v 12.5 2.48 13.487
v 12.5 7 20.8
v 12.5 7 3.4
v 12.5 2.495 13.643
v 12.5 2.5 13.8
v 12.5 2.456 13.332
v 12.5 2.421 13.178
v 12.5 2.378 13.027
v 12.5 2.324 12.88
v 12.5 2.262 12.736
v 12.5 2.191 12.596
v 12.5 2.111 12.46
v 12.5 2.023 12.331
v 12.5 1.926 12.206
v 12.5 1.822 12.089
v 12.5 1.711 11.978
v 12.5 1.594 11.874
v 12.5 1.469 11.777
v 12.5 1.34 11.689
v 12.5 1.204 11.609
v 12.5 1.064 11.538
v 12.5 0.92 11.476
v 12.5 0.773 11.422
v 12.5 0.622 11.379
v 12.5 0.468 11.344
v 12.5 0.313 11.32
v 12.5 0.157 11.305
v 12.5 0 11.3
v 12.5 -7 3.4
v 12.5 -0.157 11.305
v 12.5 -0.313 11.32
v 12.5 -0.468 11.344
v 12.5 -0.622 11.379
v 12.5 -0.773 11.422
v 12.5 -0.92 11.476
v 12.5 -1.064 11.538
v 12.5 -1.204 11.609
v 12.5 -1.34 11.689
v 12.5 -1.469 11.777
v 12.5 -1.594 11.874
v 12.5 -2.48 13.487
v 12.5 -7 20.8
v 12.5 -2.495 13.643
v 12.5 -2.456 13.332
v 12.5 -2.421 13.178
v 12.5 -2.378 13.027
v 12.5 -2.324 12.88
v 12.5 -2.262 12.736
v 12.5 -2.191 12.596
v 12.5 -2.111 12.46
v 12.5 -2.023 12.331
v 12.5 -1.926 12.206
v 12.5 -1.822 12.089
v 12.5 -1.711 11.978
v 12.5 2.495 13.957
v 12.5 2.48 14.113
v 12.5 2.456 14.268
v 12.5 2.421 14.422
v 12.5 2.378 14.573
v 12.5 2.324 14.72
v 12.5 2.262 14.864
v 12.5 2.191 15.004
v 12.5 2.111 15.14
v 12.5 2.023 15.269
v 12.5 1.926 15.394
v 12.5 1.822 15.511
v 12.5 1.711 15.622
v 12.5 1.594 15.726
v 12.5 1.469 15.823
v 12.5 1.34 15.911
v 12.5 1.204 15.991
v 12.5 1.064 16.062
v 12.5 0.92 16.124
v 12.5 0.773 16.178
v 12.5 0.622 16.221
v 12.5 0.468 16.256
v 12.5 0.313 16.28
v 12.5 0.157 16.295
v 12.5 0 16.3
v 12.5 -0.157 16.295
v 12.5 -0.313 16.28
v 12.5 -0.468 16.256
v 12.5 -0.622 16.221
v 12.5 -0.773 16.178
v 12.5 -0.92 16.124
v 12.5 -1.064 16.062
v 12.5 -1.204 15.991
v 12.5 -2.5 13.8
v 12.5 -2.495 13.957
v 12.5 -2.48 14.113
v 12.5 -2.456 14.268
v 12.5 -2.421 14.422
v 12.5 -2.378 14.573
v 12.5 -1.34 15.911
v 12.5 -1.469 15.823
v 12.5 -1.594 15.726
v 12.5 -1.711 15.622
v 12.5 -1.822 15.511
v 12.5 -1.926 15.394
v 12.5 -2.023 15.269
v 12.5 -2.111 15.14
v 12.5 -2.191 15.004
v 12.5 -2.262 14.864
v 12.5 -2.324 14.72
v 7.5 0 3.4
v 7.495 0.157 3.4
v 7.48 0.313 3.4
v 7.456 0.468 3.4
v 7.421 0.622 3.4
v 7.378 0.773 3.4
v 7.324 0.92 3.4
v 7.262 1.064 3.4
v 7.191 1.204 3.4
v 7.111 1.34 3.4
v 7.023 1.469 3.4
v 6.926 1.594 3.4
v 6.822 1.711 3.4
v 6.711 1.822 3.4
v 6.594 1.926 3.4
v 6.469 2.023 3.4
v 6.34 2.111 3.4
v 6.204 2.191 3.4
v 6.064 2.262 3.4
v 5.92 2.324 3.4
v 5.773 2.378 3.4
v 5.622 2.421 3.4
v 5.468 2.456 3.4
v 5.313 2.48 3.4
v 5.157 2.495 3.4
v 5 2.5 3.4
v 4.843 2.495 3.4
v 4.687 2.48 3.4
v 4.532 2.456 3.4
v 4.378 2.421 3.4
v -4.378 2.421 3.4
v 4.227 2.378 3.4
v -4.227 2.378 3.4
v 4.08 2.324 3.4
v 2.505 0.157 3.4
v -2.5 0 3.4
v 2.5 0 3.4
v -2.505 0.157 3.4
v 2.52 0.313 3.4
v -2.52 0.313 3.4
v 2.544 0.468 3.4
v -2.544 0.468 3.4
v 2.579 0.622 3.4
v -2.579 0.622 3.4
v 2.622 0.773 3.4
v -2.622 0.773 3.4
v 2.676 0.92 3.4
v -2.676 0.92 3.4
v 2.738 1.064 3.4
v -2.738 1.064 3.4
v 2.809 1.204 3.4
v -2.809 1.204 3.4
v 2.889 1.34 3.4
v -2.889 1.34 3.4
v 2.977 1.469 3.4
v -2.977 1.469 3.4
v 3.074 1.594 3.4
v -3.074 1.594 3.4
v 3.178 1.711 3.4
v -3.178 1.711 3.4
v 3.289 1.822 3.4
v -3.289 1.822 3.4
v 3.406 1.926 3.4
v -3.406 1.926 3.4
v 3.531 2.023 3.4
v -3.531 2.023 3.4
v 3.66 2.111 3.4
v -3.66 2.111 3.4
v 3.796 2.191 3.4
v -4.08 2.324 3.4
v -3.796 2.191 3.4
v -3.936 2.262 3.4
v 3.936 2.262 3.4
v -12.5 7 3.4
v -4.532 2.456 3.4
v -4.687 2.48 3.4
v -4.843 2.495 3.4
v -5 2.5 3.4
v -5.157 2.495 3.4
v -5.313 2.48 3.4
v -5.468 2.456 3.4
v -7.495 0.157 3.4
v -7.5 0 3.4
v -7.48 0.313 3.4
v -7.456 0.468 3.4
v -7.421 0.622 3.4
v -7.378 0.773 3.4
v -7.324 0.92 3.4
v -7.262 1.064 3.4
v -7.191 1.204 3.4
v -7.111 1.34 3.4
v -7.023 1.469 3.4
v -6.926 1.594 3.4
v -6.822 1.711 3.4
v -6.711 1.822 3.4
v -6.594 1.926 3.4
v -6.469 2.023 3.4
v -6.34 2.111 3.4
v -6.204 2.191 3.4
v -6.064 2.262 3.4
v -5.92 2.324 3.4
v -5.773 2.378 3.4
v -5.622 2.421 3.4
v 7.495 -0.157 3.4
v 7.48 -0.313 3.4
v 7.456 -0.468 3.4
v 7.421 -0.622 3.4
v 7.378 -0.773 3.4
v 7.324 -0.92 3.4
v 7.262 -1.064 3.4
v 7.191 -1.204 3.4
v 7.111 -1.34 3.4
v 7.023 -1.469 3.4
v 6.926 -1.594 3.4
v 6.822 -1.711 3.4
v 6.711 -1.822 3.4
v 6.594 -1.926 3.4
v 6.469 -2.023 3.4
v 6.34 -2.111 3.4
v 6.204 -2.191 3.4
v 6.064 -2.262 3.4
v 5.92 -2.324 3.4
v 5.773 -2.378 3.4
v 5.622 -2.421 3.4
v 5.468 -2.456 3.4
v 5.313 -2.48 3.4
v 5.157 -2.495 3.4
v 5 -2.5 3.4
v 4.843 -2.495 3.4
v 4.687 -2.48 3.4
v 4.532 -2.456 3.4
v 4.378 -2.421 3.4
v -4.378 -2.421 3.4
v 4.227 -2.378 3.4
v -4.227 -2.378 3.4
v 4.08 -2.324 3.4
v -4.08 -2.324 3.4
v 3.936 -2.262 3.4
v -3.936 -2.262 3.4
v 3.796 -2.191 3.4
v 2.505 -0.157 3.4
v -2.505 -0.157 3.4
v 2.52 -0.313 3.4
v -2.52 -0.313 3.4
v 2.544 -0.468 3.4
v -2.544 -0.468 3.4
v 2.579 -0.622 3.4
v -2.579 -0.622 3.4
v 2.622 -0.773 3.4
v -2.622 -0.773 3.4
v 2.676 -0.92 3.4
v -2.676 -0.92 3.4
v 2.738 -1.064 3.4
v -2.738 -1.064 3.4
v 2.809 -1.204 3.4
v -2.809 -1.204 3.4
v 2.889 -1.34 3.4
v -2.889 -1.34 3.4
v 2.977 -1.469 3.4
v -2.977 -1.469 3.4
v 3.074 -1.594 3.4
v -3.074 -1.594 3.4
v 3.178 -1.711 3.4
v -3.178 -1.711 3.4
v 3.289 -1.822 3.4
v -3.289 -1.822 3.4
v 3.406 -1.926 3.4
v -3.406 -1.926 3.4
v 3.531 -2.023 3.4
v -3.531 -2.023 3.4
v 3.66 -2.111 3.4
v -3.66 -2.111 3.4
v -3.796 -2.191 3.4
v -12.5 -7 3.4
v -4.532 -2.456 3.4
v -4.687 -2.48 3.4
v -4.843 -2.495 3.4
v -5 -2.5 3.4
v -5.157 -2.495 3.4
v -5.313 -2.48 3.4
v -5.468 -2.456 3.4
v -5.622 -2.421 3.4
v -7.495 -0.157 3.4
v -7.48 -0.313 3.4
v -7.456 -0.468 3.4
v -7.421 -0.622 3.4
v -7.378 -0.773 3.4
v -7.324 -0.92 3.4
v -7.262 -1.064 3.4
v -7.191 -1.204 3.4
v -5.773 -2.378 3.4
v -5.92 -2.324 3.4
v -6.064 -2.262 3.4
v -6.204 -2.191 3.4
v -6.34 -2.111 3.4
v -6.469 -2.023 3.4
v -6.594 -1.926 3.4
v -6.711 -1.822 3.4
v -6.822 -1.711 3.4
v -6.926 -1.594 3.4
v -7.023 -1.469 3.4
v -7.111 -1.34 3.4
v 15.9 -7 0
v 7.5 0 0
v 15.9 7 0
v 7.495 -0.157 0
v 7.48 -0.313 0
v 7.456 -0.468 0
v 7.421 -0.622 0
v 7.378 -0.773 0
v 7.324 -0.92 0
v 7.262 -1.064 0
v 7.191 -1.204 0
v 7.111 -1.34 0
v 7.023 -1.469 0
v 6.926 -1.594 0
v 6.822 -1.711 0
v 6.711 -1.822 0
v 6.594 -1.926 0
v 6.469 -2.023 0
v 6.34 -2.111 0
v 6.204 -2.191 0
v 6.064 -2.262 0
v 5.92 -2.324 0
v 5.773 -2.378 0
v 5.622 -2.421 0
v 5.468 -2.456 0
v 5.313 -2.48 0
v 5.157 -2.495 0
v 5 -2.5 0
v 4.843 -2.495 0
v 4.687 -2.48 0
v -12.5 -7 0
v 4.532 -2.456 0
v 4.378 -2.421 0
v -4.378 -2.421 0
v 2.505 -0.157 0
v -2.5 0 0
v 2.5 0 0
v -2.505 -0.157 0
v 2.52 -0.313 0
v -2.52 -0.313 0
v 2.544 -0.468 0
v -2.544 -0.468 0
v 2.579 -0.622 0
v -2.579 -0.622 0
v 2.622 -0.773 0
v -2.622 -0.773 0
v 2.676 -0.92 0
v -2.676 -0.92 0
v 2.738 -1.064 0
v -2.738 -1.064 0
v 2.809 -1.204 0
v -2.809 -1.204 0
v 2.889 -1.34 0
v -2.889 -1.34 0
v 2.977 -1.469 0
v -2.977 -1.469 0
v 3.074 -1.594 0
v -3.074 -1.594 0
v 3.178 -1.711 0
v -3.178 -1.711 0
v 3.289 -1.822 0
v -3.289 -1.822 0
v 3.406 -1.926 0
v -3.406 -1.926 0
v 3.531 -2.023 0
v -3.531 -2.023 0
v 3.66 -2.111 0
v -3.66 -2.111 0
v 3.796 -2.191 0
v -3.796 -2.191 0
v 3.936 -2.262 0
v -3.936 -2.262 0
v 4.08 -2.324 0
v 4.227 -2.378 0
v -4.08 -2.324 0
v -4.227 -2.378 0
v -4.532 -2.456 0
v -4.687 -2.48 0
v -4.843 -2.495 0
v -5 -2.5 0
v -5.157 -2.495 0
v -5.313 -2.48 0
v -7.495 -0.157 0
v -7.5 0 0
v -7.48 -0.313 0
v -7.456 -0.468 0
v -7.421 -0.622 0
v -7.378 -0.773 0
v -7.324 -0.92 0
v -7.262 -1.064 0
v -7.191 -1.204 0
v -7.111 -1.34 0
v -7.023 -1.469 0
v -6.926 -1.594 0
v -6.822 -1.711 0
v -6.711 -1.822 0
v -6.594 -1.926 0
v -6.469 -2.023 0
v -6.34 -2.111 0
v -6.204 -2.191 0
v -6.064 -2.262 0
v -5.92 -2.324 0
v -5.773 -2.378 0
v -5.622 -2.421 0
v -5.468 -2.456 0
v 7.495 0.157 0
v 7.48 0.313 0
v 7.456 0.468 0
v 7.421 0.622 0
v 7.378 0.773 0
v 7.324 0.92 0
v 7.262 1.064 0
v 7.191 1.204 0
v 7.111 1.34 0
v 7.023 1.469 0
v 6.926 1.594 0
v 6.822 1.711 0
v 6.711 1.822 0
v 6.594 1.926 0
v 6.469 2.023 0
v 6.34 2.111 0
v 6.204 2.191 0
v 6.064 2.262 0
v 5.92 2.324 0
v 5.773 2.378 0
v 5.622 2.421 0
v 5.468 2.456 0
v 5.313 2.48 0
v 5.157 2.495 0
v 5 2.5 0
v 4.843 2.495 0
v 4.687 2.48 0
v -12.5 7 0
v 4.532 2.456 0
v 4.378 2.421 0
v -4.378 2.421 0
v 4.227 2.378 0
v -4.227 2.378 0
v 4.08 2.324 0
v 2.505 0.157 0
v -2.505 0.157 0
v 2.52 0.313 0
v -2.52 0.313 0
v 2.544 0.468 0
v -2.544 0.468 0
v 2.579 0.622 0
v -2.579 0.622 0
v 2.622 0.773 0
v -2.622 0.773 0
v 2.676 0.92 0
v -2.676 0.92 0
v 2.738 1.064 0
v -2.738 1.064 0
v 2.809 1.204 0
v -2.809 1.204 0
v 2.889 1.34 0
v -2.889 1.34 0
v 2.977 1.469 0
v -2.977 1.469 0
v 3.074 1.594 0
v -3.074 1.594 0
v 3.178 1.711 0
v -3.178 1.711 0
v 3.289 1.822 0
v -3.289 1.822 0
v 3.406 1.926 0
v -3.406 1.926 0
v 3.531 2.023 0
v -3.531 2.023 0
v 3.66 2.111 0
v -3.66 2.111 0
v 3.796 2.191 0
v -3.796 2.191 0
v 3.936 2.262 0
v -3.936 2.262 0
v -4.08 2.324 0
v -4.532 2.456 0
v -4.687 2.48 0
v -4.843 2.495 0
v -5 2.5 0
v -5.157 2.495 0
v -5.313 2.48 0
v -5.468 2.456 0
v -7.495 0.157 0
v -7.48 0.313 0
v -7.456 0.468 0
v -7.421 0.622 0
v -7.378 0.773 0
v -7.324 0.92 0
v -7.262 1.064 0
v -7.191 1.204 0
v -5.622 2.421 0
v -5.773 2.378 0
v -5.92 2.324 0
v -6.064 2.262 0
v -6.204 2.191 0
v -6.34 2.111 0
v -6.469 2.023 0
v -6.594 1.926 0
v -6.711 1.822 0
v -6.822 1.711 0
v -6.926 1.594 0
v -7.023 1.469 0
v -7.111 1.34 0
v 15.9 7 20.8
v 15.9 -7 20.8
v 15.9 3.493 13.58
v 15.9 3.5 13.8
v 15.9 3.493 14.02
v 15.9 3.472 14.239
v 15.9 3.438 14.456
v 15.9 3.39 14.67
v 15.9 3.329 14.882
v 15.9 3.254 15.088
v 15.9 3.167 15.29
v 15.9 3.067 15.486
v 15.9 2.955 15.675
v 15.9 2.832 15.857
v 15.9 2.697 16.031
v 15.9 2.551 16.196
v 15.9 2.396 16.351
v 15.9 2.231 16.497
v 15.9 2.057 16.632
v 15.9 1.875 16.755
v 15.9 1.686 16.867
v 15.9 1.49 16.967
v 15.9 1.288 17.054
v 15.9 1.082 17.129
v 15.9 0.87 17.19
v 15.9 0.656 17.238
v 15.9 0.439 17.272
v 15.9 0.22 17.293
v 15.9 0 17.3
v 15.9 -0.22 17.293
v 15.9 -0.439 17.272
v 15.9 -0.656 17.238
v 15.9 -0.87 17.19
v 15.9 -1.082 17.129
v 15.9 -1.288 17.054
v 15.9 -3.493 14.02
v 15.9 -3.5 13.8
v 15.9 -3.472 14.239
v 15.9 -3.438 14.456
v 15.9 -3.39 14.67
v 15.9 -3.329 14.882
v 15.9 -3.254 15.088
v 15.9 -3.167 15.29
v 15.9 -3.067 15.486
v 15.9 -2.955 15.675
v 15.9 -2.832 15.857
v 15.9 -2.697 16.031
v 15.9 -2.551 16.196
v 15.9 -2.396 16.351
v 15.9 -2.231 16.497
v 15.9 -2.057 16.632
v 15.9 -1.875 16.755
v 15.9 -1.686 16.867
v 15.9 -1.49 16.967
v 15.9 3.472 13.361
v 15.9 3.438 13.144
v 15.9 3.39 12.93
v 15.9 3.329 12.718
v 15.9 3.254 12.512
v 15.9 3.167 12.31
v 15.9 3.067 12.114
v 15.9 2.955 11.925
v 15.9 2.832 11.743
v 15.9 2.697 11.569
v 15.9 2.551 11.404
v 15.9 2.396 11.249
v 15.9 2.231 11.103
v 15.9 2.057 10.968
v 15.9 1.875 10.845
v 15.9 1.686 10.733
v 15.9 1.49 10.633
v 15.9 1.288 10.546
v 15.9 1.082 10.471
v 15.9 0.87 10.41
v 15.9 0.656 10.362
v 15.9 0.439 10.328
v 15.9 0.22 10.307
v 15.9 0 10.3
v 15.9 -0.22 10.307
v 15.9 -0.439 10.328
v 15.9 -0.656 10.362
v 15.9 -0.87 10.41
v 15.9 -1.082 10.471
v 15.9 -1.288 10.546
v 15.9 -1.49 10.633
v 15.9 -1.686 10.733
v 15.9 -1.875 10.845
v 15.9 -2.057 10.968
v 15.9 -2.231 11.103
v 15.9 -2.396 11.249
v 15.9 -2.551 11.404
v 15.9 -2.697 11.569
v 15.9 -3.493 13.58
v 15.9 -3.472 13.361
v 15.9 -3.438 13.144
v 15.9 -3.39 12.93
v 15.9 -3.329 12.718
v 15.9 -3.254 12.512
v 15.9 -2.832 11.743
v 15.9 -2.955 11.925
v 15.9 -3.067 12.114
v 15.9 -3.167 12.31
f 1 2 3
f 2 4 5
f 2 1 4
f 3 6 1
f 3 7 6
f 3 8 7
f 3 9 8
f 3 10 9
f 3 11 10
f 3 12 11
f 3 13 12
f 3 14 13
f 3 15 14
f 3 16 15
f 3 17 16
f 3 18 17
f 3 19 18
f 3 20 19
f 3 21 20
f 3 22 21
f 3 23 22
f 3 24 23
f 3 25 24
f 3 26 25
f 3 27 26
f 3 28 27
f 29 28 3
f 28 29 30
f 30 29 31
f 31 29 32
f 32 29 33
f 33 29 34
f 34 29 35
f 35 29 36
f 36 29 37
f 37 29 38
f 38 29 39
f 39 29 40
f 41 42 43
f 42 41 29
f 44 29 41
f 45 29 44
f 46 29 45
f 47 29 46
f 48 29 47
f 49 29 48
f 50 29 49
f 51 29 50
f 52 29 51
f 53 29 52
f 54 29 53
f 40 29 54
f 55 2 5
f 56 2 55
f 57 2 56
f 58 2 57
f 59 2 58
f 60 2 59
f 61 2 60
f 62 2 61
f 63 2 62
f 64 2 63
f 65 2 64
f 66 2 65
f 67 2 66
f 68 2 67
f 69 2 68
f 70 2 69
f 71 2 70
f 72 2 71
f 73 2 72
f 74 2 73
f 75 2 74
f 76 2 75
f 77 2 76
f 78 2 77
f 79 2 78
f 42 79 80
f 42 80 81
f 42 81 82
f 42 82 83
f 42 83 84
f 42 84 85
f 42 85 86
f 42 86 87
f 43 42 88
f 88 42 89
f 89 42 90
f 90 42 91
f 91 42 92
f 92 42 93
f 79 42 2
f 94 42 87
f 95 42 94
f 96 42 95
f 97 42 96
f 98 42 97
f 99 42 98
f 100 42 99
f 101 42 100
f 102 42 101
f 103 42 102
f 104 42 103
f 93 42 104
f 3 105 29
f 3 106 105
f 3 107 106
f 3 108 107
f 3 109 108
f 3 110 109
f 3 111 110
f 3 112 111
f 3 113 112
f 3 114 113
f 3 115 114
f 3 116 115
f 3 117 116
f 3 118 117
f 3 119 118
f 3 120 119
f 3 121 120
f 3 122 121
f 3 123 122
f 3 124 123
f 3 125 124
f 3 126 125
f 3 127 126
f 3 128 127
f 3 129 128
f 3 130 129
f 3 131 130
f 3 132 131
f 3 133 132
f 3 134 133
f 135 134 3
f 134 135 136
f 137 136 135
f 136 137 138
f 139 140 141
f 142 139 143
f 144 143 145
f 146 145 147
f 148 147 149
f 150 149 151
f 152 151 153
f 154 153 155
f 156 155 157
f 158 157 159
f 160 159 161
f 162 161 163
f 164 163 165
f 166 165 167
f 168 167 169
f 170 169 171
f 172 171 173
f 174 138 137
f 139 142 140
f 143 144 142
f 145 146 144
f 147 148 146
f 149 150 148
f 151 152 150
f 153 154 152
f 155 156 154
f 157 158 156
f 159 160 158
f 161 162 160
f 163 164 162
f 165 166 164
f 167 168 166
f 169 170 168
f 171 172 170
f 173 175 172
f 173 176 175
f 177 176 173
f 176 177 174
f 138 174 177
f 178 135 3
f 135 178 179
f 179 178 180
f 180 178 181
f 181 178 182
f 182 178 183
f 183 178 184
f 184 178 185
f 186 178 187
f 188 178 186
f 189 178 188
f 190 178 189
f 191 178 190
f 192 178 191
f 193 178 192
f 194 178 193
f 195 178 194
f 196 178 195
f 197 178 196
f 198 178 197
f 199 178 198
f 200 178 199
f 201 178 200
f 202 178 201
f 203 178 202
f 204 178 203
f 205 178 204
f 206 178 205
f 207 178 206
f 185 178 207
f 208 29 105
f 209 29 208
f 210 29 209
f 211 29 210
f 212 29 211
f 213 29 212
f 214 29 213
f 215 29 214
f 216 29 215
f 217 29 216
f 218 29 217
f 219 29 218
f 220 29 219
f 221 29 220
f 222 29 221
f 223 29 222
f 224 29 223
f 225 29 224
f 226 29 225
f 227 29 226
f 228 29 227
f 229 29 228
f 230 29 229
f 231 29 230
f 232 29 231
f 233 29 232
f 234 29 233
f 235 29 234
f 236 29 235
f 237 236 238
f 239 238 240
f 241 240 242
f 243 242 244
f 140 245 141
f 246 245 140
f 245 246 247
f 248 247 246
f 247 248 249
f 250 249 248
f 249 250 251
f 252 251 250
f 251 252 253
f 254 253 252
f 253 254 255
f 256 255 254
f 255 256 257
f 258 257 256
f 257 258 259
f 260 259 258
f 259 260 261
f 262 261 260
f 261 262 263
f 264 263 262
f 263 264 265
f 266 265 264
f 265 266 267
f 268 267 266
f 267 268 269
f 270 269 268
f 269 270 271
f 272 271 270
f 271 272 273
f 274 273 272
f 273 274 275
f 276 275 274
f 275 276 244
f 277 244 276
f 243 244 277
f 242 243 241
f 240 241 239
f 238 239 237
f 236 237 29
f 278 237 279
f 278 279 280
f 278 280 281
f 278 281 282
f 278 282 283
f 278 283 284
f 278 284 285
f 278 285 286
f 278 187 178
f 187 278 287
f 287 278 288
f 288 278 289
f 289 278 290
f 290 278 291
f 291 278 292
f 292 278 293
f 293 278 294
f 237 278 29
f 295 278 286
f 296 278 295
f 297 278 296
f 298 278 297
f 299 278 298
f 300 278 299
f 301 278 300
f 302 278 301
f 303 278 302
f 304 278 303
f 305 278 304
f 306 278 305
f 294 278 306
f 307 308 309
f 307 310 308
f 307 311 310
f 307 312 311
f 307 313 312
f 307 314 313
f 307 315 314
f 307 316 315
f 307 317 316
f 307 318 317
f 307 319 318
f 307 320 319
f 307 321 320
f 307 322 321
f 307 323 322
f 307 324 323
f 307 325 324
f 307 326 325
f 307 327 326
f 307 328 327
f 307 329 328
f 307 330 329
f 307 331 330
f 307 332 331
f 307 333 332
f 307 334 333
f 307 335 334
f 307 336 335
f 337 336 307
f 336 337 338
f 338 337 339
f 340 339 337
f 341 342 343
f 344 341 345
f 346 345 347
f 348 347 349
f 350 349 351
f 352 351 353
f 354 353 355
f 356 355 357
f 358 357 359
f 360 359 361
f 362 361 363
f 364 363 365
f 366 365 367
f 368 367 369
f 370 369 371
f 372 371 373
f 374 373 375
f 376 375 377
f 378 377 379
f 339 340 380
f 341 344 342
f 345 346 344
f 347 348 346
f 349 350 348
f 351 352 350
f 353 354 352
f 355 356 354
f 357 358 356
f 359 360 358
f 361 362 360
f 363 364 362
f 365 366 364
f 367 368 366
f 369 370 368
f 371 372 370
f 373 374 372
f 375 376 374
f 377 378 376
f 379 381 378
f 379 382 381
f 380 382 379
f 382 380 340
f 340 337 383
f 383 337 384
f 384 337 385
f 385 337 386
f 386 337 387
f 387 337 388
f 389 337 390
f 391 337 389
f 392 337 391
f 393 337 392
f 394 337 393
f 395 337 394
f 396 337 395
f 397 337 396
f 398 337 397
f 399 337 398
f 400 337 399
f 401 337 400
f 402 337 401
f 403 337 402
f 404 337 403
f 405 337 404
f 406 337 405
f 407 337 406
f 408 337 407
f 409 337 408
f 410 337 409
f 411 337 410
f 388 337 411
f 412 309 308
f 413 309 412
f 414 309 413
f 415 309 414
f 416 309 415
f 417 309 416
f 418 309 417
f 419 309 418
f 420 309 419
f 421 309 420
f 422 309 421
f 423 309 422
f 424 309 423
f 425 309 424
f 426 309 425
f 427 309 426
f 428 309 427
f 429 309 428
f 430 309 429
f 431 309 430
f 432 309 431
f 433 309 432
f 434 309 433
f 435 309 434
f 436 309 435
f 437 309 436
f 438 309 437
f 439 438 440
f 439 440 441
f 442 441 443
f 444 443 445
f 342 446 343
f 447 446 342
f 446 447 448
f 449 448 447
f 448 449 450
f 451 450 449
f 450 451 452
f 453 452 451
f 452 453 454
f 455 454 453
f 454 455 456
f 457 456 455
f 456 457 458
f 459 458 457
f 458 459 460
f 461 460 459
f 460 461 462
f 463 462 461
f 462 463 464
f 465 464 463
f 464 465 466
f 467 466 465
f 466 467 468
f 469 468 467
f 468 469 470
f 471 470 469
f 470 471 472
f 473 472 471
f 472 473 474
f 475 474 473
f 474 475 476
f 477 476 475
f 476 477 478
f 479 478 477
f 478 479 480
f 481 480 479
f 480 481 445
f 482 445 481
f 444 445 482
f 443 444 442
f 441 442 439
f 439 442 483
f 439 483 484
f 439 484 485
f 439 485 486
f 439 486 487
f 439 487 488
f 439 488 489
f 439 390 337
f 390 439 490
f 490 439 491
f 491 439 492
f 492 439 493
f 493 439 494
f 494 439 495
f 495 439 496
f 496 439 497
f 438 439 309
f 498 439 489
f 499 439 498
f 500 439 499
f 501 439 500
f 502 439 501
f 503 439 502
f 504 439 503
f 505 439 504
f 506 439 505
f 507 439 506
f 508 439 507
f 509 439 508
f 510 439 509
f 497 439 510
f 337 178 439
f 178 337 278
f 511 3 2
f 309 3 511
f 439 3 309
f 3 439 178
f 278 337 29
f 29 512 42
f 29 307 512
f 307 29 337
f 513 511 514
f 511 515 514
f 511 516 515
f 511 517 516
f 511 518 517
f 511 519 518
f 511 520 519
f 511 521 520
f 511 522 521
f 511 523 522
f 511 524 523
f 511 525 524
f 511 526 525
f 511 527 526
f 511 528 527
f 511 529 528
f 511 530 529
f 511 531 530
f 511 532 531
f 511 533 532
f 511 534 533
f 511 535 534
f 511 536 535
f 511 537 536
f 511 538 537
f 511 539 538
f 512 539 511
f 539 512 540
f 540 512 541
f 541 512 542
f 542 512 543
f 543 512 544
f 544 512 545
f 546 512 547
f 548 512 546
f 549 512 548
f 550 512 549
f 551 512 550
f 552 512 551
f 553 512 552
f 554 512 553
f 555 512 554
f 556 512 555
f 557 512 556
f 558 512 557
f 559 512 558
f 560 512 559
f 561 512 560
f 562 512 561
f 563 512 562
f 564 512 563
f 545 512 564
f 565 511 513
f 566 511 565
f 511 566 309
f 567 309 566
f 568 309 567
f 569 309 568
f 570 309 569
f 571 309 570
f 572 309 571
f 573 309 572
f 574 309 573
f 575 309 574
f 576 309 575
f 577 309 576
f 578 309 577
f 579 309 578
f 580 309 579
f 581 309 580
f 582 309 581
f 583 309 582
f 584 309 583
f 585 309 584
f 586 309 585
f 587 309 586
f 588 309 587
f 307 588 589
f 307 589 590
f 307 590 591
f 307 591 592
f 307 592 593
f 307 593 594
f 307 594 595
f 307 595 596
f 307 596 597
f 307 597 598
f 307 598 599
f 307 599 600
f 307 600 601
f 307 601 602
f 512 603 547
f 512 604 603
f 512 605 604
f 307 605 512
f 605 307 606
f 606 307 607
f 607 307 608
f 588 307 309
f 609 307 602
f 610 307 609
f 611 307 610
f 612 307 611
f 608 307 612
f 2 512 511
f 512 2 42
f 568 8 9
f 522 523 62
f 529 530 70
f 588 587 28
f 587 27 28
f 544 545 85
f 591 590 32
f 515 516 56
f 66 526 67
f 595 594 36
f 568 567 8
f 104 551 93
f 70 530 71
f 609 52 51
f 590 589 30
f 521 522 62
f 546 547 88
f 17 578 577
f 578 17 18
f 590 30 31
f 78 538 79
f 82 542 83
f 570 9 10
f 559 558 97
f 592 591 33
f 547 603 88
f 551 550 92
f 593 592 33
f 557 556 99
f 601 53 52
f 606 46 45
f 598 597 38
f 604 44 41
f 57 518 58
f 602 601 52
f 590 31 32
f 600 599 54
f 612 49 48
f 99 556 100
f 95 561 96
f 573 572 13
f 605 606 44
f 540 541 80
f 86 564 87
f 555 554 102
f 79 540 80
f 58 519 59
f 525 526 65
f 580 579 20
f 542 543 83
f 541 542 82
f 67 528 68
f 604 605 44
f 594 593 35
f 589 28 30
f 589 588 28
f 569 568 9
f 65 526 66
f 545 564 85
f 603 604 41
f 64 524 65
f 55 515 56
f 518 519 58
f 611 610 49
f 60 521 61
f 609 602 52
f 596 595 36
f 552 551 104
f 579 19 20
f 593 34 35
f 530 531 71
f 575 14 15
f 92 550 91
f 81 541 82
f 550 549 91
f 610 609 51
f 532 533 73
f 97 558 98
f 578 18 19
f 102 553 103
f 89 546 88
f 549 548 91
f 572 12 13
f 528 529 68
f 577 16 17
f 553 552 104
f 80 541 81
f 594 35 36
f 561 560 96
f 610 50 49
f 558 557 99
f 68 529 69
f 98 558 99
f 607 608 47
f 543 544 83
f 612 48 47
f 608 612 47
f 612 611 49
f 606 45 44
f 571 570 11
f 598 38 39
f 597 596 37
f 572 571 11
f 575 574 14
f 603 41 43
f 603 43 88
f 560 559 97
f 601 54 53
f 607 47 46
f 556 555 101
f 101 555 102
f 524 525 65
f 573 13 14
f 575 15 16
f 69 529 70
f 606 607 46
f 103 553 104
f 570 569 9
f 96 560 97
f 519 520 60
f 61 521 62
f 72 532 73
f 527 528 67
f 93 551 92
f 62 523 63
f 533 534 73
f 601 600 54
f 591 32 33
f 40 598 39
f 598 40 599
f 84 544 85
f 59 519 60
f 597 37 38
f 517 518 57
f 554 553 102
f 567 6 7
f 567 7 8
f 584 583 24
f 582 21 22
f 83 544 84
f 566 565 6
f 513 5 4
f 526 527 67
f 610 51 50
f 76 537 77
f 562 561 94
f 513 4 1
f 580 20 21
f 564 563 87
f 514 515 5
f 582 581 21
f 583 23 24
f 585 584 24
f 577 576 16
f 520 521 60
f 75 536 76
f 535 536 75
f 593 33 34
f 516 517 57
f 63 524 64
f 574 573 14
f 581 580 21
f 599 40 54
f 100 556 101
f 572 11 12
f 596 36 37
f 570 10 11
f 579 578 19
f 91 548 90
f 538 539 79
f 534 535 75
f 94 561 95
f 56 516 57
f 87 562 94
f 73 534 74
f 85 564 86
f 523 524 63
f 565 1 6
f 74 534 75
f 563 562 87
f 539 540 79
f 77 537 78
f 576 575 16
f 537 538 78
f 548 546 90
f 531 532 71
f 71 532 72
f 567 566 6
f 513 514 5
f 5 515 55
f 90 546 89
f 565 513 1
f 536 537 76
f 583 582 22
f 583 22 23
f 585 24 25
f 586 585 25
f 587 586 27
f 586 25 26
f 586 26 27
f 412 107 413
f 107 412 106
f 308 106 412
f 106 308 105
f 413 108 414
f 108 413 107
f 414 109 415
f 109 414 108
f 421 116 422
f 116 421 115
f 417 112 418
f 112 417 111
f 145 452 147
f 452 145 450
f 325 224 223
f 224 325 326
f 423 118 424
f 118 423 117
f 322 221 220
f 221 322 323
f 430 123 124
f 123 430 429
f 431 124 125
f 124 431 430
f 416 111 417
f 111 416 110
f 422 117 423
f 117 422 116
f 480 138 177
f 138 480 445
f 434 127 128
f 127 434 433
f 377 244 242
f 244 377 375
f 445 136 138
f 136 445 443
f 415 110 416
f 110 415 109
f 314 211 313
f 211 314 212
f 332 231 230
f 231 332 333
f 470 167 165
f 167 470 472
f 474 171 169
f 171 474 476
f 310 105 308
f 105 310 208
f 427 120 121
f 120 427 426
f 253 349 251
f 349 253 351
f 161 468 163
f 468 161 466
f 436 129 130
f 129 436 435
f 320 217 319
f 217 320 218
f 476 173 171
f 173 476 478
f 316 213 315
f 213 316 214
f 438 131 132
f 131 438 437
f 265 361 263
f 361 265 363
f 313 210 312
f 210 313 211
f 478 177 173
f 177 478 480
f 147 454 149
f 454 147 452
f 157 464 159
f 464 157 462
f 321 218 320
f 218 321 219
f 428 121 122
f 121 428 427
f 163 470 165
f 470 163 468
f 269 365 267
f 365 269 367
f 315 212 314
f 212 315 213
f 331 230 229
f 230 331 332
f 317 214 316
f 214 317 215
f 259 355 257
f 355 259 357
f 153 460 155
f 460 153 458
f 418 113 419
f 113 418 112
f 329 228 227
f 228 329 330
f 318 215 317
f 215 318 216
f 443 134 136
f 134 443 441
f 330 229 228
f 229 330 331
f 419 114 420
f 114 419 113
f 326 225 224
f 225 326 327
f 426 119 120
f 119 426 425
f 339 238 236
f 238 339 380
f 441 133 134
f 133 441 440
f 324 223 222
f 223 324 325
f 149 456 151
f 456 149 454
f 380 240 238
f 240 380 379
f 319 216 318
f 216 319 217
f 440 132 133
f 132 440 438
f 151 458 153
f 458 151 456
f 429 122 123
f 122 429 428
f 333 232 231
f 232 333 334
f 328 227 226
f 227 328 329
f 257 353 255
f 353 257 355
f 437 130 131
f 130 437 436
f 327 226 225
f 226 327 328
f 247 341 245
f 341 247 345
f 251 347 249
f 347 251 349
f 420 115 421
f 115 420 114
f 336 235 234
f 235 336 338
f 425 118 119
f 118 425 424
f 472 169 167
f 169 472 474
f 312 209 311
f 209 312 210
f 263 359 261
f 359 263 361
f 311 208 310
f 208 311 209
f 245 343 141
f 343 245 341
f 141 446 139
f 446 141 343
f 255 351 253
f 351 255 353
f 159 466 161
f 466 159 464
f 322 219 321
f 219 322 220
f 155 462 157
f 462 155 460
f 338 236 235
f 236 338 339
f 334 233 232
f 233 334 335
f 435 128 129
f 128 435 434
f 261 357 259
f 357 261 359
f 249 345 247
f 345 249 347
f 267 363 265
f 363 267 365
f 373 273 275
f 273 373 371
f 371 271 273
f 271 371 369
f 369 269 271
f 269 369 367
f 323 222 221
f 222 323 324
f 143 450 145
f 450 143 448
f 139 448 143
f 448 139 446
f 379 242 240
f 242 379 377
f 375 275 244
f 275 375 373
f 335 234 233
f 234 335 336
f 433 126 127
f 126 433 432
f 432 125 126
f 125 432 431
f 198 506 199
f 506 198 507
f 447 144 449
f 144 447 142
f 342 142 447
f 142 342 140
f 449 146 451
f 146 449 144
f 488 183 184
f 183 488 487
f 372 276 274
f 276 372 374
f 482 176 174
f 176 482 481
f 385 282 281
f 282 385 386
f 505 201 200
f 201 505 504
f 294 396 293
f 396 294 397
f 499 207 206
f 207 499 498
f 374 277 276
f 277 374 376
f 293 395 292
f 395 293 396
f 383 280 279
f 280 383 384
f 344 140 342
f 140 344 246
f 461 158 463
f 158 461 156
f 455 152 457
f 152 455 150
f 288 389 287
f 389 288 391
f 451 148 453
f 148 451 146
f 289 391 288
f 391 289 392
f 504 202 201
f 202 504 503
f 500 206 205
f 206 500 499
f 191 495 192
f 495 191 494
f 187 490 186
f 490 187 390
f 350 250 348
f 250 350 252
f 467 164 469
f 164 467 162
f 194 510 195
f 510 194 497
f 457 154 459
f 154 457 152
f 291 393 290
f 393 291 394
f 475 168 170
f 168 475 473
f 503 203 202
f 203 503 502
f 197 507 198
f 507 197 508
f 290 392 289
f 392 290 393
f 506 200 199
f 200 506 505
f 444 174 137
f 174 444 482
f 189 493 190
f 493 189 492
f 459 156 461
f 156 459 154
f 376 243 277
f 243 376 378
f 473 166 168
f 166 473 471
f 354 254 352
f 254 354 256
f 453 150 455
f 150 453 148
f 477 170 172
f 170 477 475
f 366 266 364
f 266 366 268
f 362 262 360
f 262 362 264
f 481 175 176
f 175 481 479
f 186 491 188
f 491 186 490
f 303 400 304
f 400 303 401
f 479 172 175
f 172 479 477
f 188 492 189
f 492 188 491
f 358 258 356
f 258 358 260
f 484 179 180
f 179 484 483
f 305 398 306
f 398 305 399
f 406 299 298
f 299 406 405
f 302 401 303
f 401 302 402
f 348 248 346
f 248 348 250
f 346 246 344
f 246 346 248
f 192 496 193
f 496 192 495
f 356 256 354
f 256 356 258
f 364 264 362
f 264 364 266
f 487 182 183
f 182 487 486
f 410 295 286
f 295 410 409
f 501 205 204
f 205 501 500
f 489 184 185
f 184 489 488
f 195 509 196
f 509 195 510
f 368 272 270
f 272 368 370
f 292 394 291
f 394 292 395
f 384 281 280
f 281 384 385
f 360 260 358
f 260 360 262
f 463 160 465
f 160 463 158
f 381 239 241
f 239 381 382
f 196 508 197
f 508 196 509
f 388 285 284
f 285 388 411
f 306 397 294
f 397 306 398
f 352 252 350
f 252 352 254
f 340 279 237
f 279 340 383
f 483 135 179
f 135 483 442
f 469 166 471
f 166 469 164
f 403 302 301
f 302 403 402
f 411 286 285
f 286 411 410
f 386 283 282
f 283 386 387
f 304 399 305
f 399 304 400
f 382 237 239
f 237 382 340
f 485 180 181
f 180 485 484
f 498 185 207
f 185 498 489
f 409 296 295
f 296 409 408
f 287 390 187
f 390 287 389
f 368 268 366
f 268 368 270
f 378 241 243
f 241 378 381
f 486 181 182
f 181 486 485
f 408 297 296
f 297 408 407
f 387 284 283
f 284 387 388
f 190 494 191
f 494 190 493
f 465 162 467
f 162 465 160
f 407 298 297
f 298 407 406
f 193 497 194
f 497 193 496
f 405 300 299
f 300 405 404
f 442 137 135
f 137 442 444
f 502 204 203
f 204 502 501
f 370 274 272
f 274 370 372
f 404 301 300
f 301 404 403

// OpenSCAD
$fn = 100;

wall = 3.4;

sizex = 25;
sizey = 14;

fanholeoutd = 7;
fanholeind = 5;
mountholed = 5;
centerdiff = 5;

module base(){
    translate([0,0,wall/2]) cube([sizex, sizey, wall], center=true);
    translate([sizex/2+wall/2,0,sizey/2+wall])cube([wall, sizey, sizey+wall*2], center=true);
}

module holes(){
    translate([sizex/2,0,sizey/2+wall*2]) rotate([0,90,0]) cylinder(d1=fanholeind, d2=fanholeoutd, h=wall);
    translate([centerdiff,0,0]) cylinder(d=mountholed, h=100);
    translate([-centerdiff,0,0]) cylinder(d=mountholed, h=100);
}

difference(){
    base();
    holes();
}
